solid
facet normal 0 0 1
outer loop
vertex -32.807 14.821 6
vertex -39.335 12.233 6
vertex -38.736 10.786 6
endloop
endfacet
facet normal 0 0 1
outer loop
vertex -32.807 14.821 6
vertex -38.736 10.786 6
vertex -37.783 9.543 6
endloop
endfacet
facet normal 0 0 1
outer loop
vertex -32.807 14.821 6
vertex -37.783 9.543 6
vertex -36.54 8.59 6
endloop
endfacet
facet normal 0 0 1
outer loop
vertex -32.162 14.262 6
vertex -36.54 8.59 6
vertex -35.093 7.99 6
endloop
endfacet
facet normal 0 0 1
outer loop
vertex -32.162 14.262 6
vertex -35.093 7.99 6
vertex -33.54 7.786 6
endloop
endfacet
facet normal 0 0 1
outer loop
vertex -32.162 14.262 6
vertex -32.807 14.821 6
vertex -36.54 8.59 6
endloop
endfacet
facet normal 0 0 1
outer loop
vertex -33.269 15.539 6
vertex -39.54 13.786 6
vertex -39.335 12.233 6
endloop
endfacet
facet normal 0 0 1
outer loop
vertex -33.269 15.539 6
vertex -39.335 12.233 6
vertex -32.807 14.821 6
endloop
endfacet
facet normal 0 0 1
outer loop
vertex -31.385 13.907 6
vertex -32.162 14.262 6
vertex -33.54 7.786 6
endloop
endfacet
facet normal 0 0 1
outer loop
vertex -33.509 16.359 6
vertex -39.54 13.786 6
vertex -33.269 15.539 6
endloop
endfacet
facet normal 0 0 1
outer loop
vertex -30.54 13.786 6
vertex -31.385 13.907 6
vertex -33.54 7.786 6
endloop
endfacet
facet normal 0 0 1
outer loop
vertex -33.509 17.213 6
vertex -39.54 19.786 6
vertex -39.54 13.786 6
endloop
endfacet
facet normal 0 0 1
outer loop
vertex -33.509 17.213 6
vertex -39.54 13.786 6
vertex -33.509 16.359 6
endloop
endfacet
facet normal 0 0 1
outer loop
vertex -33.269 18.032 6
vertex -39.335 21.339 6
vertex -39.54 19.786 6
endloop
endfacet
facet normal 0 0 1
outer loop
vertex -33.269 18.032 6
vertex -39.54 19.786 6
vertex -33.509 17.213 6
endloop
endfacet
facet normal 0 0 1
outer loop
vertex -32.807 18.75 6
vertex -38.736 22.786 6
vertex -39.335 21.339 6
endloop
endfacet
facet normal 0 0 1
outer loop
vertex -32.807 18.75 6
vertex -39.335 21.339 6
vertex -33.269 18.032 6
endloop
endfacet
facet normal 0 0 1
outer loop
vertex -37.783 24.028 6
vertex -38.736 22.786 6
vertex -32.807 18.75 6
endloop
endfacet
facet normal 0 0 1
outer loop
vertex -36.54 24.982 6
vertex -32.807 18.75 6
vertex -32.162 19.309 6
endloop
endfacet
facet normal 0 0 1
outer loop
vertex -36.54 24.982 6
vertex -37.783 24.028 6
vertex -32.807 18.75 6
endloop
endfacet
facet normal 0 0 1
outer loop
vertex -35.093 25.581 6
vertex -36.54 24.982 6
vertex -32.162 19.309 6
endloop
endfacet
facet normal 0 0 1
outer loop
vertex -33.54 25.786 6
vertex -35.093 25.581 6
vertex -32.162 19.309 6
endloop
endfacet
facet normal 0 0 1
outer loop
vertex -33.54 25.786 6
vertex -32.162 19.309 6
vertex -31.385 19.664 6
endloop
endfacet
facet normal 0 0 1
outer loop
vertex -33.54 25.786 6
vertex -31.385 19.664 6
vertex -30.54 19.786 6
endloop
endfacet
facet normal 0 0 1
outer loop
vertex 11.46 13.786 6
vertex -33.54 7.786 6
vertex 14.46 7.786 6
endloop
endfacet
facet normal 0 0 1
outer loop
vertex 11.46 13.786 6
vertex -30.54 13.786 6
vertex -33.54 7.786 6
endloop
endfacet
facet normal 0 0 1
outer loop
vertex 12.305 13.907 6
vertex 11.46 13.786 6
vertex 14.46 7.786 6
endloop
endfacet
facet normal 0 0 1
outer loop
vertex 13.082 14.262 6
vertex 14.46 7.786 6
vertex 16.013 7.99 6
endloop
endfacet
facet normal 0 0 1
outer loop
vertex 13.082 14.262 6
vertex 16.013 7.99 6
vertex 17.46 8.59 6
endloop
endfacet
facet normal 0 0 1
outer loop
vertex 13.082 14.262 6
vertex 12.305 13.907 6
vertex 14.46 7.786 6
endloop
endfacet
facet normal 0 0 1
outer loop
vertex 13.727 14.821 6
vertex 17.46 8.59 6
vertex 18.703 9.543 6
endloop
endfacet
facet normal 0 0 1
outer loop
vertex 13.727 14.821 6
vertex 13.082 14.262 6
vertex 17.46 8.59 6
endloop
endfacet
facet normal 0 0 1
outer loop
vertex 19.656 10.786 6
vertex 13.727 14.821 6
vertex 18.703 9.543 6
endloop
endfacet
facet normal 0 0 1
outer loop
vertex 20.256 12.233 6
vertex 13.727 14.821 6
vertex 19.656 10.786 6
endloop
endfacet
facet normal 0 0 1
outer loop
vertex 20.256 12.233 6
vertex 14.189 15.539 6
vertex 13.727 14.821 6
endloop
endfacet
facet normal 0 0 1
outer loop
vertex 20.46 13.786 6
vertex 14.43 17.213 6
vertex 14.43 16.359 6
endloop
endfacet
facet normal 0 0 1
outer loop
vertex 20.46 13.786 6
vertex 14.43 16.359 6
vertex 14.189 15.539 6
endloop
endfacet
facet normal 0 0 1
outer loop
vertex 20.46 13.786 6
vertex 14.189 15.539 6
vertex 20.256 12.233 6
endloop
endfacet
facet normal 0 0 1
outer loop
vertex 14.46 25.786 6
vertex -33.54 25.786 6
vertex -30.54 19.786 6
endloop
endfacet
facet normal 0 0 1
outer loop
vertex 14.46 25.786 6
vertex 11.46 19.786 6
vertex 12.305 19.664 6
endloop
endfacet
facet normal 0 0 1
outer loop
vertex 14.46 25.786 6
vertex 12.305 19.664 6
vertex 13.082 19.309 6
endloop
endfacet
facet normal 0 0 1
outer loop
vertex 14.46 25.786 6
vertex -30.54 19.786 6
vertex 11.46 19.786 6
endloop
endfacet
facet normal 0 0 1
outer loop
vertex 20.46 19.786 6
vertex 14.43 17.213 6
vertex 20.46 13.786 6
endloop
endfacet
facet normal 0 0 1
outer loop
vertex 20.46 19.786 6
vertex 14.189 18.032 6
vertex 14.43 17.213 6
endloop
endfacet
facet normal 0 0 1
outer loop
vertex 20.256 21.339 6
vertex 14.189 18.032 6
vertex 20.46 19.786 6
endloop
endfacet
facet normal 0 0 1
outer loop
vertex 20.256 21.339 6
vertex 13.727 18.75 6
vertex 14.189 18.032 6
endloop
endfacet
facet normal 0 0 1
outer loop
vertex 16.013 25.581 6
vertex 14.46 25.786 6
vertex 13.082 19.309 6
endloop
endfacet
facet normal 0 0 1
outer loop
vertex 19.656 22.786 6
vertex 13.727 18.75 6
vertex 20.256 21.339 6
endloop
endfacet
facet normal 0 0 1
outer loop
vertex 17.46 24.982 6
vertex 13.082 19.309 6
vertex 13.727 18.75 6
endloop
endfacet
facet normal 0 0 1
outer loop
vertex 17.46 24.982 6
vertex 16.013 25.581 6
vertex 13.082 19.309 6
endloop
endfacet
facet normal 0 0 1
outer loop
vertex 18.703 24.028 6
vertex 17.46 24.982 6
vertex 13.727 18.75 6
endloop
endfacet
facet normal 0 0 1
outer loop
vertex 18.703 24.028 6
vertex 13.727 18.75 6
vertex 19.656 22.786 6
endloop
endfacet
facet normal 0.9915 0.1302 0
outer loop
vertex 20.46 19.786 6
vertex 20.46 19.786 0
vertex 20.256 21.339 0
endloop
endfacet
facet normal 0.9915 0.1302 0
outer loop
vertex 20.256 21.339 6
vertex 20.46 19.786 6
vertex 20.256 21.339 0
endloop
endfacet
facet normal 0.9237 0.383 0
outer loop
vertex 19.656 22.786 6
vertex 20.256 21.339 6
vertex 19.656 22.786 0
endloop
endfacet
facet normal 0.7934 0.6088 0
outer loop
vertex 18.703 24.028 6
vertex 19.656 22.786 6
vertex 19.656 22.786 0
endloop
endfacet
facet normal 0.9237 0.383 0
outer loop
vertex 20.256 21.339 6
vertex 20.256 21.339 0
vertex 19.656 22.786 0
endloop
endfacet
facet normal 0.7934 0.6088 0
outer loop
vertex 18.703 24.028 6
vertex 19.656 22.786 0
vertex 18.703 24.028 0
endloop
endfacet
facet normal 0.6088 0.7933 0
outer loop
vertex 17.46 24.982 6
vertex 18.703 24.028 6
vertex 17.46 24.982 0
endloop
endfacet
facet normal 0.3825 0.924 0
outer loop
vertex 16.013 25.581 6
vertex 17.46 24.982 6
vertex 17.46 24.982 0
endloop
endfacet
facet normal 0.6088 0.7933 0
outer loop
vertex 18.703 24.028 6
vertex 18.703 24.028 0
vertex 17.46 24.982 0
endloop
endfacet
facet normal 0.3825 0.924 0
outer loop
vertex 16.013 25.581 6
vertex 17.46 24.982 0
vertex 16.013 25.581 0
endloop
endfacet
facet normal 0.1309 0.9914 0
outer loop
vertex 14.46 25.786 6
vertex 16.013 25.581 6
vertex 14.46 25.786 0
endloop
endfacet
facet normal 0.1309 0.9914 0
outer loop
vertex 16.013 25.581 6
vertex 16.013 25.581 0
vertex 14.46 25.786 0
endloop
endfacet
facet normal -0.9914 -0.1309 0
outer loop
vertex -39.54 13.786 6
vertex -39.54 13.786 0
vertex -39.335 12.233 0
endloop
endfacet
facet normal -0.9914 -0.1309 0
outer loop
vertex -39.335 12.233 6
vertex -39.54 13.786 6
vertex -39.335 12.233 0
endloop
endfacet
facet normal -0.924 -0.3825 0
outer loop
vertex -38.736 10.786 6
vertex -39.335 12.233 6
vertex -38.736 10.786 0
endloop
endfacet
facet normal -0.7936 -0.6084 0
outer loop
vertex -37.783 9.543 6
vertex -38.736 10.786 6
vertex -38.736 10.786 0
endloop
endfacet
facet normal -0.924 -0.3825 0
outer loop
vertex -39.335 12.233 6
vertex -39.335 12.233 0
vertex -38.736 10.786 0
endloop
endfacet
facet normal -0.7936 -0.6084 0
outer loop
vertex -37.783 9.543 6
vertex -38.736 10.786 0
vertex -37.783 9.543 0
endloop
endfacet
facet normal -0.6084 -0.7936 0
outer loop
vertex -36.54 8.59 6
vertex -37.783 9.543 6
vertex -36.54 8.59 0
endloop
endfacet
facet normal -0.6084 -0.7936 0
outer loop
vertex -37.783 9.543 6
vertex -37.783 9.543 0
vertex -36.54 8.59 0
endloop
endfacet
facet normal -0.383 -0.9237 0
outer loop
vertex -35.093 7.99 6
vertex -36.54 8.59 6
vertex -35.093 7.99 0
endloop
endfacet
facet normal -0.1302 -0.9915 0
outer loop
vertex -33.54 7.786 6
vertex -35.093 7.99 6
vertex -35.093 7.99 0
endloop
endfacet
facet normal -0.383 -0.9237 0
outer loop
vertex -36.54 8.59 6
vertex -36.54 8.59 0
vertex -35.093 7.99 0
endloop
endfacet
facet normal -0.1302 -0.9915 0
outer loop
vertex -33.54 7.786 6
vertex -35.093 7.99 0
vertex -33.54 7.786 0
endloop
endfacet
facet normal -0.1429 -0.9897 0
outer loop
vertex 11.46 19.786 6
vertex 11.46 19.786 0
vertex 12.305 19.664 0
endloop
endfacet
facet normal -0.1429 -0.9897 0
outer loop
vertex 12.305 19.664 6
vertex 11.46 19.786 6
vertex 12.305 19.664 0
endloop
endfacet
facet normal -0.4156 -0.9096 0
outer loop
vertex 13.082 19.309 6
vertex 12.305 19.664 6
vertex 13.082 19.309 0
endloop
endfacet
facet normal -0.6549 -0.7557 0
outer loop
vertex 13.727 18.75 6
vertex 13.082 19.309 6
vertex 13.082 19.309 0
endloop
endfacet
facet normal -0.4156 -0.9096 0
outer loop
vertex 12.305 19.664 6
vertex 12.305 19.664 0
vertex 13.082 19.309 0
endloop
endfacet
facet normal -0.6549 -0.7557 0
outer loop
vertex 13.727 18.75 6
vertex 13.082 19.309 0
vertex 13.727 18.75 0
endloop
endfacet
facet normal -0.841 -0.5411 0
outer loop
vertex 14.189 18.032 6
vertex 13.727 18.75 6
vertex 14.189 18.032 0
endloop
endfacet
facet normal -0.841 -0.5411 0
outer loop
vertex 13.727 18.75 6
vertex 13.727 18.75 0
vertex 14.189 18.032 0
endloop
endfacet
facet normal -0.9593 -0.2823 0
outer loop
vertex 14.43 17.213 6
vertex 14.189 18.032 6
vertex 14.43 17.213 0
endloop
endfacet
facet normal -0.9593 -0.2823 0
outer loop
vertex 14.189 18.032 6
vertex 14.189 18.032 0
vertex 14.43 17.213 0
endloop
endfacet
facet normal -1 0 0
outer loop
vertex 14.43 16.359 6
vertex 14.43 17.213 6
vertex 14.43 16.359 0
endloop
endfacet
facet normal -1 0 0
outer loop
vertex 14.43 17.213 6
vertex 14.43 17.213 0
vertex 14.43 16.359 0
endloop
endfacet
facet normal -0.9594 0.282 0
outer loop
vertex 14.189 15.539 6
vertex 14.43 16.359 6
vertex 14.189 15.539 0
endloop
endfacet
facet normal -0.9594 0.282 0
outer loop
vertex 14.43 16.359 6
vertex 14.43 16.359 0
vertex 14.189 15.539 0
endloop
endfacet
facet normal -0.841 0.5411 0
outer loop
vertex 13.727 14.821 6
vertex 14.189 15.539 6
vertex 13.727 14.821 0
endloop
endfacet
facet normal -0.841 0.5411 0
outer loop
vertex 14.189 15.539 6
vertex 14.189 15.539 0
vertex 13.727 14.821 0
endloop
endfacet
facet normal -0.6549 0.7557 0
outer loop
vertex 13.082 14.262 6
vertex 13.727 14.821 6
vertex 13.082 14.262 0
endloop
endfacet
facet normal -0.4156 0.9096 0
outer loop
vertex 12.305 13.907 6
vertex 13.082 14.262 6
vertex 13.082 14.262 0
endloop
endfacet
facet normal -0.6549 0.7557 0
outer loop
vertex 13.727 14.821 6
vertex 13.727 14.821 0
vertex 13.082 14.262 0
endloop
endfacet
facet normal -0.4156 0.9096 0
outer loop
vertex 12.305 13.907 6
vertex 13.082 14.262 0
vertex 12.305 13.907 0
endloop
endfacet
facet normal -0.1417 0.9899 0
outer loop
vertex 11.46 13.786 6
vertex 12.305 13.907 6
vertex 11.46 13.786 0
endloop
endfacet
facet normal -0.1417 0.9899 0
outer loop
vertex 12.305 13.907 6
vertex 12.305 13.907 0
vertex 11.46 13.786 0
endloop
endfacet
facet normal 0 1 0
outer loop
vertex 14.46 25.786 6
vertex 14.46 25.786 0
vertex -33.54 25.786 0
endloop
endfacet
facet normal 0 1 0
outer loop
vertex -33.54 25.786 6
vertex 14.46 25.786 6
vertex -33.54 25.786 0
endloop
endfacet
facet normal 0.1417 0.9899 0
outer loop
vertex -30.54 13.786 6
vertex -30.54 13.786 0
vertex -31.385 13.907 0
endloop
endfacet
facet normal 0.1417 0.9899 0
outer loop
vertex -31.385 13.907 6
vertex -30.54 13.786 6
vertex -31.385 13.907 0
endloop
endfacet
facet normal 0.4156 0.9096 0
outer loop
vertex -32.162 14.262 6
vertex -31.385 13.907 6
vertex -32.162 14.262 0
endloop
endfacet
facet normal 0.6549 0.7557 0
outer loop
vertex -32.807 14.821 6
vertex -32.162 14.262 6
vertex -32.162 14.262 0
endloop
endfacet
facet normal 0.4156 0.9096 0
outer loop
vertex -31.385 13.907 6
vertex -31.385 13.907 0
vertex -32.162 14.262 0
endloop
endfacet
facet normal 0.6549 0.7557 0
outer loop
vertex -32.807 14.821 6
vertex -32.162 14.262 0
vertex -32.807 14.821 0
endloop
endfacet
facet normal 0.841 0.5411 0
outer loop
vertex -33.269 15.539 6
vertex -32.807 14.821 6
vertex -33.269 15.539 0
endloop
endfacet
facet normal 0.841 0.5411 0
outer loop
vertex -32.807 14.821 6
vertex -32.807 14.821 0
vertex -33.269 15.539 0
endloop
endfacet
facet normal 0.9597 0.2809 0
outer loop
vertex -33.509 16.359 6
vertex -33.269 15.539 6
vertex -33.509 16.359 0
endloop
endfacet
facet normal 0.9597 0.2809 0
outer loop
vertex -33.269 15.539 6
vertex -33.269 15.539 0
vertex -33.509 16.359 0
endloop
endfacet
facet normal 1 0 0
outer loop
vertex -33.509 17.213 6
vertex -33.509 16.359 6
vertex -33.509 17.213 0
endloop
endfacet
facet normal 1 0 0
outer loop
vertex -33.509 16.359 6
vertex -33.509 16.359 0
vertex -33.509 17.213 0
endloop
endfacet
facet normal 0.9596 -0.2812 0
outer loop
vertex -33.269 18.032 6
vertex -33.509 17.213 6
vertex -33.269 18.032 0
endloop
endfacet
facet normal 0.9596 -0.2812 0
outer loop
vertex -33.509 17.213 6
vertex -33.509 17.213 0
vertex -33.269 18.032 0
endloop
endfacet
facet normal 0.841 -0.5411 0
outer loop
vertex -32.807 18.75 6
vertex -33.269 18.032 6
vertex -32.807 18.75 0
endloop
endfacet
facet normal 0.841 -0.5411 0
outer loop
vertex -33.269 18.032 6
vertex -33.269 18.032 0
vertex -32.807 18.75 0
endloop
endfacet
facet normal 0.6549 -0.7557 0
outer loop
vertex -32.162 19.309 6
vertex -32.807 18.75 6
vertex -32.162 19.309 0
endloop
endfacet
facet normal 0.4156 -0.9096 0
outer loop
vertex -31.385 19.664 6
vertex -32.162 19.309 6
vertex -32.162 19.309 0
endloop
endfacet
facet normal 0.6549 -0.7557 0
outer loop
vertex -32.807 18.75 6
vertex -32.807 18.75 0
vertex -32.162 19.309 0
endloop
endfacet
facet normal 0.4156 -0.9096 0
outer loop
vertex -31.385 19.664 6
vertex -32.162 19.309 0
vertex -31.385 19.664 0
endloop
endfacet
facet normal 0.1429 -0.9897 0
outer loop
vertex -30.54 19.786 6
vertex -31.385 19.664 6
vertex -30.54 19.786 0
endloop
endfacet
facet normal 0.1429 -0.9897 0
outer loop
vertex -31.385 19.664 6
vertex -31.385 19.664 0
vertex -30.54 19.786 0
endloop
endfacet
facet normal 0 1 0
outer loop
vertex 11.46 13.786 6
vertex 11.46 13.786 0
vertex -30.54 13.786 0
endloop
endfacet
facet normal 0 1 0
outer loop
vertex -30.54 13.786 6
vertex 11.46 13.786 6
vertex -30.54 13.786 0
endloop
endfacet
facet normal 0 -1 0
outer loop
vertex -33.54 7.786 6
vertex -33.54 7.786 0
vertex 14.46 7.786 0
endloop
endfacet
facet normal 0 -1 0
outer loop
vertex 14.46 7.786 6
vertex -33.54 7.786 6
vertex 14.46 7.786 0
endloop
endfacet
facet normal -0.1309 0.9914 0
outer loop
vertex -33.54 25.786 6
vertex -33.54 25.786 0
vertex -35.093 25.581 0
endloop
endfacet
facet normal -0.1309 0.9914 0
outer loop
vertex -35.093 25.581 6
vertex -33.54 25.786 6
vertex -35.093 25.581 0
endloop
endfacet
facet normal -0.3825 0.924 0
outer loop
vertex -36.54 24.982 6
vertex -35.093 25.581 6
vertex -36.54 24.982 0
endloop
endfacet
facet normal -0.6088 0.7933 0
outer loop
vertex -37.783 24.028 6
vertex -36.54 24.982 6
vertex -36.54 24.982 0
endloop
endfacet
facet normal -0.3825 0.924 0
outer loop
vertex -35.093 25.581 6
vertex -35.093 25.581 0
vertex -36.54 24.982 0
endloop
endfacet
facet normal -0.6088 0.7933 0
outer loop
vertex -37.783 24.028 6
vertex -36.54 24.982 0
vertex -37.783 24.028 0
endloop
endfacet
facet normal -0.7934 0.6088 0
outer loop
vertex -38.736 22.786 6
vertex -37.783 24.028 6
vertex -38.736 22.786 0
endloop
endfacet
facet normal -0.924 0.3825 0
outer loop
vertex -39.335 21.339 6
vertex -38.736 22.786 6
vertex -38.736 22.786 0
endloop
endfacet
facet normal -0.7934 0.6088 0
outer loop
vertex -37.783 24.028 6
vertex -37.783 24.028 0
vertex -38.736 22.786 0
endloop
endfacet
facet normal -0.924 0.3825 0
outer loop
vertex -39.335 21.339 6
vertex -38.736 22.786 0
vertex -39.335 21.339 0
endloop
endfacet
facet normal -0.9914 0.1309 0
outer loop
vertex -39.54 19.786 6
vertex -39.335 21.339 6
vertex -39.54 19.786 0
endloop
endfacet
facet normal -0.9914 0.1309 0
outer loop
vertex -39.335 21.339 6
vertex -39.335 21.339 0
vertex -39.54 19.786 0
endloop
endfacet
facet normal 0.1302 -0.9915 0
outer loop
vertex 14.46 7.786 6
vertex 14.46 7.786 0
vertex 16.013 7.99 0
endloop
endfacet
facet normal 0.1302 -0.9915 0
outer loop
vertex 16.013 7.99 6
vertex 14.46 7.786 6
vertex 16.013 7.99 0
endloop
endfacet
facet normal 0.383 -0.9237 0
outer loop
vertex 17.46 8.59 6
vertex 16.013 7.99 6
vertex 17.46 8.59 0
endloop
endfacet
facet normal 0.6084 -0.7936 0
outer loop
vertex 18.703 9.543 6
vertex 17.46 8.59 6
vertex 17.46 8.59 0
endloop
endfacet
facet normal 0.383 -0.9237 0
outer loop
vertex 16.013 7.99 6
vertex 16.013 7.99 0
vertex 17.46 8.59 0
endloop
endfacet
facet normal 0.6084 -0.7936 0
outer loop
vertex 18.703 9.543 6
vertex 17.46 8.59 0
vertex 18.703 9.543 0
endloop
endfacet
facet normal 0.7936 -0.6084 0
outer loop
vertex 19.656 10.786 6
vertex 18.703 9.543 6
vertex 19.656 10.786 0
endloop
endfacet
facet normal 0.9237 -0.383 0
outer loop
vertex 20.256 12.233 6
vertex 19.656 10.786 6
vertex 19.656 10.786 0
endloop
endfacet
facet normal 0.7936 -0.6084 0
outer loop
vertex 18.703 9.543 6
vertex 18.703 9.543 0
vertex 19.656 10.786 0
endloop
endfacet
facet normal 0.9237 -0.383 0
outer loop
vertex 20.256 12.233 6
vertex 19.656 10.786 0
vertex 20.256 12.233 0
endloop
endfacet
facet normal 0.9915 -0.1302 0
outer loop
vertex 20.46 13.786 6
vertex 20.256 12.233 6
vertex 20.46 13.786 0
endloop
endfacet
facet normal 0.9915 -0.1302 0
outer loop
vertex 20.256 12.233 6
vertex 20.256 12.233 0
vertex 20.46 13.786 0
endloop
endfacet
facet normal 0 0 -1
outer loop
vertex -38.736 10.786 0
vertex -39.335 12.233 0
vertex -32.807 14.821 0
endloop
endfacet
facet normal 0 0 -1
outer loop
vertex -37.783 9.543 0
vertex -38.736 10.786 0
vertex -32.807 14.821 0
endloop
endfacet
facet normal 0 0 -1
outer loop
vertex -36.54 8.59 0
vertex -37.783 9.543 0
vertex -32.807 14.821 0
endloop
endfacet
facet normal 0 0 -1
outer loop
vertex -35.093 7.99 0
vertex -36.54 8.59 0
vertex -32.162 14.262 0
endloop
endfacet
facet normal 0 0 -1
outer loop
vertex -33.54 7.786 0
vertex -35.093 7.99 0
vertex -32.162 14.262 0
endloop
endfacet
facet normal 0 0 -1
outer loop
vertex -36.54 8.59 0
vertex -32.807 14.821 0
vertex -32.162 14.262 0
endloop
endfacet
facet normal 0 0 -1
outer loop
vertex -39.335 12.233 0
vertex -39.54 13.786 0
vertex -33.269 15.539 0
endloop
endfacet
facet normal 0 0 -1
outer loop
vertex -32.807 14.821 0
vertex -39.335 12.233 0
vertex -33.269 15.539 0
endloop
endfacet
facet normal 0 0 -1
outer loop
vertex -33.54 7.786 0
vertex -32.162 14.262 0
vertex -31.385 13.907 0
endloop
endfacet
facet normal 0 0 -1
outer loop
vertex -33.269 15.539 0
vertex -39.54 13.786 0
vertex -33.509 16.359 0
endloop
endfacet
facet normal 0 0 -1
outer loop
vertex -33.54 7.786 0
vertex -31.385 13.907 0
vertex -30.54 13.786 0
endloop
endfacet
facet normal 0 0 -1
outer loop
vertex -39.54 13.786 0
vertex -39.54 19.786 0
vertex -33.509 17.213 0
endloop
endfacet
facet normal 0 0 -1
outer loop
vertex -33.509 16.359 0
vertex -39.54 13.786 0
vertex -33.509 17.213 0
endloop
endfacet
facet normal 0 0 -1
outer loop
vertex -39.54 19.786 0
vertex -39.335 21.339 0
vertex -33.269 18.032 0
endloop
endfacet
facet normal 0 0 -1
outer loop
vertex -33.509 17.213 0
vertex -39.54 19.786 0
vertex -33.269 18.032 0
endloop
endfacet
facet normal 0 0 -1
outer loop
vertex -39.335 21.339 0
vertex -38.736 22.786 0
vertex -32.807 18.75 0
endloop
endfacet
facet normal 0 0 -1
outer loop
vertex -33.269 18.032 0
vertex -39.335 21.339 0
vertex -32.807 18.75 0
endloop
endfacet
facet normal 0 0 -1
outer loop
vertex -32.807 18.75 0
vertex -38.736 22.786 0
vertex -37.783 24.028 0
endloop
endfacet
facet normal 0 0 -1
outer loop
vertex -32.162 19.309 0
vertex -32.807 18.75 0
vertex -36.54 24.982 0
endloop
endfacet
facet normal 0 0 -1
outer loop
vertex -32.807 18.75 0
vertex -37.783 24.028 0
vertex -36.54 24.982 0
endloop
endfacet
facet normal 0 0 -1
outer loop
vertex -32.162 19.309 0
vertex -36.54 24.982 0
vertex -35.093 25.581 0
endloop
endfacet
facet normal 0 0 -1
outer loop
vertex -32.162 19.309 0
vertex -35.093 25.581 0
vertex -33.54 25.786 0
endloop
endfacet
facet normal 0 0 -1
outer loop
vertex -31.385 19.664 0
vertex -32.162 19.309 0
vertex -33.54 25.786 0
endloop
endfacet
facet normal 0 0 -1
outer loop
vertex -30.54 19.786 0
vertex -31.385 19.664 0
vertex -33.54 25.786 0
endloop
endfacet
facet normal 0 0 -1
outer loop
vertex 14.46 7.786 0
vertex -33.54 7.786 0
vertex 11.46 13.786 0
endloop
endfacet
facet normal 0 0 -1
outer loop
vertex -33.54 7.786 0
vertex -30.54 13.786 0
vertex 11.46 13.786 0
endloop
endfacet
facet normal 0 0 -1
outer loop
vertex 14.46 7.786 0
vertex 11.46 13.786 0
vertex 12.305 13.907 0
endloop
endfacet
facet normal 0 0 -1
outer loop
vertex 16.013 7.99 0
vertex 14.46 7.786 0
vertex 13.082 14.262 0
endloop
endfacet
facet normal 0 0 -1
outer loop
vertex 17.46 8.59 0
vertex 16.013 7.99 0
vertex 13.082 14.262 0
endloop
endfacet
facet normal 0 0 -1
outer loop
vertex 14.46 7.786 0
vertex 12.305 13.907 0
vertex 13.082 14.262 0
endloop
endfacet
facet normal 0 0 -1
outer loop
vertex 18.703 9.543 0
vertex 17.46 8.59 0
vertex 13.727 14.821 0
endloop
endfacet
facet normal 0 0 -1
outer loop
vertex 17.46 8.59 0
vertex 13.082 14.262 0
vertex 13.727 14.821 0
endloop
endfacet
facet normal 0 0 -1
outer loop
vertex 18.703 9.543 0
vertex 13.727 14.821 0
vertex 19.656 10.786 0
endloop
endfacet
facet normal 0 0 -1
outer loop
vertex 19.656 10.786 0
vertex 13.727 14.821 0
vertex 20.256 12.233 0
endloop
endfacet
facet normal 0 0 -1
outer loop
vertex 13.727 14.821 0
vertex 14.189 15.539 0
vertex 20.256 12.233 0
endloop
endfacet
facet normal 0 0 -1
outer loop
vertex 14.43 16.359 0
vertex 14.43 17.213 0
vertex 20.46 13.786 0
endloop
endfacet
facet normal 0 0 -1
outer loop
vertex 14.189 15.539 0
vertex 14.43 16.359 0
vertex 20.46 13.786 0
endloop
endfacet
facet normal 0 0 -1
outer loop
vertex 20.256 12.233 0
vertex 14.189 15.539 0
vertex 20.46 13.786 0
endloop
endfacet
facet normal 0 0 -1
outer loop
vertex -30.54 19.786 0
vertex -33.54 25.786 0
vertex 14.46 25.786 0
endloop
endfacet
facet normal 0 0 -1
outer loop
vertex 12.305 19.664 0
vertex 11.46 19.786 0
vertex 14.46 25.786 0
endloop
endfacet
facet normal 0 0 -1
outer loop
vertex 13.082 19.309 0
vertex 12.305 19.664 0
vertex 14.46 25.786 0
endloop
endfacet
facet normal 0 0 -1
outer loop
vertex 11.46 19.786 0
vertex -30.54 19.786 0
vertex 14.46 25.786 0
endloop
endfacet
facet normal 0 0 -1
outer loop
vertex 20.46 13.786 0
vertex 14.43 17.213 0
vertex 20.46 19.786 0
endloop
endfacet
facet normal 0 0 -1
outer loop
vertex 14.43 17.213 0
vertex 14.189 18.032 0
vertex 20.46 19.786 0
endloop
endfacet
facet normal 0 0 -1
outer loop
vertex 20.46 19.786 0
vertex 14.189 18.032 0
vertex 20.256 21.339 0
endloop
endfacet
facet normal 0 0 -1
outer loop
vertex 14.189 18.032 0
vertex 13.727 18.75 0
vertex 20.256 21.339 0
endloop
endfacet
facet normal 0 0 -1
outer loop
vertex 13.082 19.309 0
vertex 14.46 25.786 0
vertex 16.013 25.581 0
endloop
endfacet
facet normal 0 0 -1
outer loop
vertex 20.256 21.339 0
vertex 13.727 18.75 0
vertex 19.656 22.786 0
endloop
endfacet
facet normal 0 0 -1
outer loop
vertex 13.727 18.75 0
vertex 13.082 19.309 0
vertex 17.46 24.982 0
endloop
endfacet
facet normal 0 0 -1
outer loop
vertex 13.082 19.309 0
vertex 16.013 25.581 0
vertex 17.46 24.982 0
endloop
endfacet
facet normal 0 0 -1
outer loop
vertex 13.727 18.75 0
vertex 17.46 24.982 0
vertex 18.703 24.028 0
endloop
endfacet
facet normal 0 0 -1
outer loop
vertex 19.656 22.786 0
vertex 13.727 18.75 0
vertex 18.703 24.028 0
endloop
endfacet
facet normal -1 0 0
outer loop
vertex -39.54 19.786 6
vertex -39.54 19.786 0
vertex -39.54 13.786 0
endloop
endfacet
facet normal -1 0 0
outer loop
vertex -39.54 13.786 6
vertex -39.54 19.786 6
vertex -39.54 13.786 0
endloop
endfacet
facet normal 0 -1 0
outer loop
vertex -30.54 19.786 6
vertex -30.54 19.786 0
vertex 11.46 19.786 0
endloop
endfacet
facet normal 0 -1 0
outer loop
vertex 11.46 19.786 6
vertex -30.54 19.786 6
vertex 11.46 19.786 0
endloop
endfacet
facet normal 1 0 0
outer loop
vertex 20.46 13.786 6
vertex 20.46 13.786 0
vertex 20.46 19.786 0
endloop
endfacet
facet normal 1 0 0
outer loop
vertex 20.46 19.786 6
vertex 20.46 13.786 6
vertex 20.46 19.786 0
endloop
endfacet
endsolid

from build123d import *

# Parameters (mm, degrees)
F1_DEPTH = 6


with BuildPart() as f1:
    # F0 (on Top) → F1 (new body)
    with BuildSketch(Plane.XY):
        with BuildLine():
            ThreePointArc((-39.53987, 13.785708), (-37.782511, 9.543067), (-33.53987, 7.785708))
            Line((-33.53987, 7.785708), (14.46013, 7.785708))
            ThreePointArc((14.46013, 7.785708), (18.702771, 9.543067), (20.46013, 13.785708))
            Line((20.46013, 13.785708), (20.46013, 19.785708))
            ThreePointArc((20.46013, 19.785708), (18.702771, 24.028348), (14.46013, 25.785708))
            Line((14.46013, 25.785708), (-33.53987, 25.785708))
            ThreePointArc((-33.53987, 25.785708), (-37.782511, 24.028348), (-39.53987, 19.785708))
            Line((-39.53987, 19.785708), (-39.53987, 13.785708))
        make_face()
        with BuildLine():
            Line((11.46013, 13.785708), (-30.53987, 13.785708))
            ThreePointArc((-30.53987, 13.785708), (-33.53987, 16.785708), (-30.53987, 19.785708))
            Line((-30.53987, 19.785708), (11.46013, 19.785708))
            ThreePointArc((11.46013, 19.785708), (14.46013, 16.785708), (11.46013, 13.785708))
        make_face(mode=Mode.SUBTRACT)
    extrude(amount=F1_DEPTH)


solid = f1.part
